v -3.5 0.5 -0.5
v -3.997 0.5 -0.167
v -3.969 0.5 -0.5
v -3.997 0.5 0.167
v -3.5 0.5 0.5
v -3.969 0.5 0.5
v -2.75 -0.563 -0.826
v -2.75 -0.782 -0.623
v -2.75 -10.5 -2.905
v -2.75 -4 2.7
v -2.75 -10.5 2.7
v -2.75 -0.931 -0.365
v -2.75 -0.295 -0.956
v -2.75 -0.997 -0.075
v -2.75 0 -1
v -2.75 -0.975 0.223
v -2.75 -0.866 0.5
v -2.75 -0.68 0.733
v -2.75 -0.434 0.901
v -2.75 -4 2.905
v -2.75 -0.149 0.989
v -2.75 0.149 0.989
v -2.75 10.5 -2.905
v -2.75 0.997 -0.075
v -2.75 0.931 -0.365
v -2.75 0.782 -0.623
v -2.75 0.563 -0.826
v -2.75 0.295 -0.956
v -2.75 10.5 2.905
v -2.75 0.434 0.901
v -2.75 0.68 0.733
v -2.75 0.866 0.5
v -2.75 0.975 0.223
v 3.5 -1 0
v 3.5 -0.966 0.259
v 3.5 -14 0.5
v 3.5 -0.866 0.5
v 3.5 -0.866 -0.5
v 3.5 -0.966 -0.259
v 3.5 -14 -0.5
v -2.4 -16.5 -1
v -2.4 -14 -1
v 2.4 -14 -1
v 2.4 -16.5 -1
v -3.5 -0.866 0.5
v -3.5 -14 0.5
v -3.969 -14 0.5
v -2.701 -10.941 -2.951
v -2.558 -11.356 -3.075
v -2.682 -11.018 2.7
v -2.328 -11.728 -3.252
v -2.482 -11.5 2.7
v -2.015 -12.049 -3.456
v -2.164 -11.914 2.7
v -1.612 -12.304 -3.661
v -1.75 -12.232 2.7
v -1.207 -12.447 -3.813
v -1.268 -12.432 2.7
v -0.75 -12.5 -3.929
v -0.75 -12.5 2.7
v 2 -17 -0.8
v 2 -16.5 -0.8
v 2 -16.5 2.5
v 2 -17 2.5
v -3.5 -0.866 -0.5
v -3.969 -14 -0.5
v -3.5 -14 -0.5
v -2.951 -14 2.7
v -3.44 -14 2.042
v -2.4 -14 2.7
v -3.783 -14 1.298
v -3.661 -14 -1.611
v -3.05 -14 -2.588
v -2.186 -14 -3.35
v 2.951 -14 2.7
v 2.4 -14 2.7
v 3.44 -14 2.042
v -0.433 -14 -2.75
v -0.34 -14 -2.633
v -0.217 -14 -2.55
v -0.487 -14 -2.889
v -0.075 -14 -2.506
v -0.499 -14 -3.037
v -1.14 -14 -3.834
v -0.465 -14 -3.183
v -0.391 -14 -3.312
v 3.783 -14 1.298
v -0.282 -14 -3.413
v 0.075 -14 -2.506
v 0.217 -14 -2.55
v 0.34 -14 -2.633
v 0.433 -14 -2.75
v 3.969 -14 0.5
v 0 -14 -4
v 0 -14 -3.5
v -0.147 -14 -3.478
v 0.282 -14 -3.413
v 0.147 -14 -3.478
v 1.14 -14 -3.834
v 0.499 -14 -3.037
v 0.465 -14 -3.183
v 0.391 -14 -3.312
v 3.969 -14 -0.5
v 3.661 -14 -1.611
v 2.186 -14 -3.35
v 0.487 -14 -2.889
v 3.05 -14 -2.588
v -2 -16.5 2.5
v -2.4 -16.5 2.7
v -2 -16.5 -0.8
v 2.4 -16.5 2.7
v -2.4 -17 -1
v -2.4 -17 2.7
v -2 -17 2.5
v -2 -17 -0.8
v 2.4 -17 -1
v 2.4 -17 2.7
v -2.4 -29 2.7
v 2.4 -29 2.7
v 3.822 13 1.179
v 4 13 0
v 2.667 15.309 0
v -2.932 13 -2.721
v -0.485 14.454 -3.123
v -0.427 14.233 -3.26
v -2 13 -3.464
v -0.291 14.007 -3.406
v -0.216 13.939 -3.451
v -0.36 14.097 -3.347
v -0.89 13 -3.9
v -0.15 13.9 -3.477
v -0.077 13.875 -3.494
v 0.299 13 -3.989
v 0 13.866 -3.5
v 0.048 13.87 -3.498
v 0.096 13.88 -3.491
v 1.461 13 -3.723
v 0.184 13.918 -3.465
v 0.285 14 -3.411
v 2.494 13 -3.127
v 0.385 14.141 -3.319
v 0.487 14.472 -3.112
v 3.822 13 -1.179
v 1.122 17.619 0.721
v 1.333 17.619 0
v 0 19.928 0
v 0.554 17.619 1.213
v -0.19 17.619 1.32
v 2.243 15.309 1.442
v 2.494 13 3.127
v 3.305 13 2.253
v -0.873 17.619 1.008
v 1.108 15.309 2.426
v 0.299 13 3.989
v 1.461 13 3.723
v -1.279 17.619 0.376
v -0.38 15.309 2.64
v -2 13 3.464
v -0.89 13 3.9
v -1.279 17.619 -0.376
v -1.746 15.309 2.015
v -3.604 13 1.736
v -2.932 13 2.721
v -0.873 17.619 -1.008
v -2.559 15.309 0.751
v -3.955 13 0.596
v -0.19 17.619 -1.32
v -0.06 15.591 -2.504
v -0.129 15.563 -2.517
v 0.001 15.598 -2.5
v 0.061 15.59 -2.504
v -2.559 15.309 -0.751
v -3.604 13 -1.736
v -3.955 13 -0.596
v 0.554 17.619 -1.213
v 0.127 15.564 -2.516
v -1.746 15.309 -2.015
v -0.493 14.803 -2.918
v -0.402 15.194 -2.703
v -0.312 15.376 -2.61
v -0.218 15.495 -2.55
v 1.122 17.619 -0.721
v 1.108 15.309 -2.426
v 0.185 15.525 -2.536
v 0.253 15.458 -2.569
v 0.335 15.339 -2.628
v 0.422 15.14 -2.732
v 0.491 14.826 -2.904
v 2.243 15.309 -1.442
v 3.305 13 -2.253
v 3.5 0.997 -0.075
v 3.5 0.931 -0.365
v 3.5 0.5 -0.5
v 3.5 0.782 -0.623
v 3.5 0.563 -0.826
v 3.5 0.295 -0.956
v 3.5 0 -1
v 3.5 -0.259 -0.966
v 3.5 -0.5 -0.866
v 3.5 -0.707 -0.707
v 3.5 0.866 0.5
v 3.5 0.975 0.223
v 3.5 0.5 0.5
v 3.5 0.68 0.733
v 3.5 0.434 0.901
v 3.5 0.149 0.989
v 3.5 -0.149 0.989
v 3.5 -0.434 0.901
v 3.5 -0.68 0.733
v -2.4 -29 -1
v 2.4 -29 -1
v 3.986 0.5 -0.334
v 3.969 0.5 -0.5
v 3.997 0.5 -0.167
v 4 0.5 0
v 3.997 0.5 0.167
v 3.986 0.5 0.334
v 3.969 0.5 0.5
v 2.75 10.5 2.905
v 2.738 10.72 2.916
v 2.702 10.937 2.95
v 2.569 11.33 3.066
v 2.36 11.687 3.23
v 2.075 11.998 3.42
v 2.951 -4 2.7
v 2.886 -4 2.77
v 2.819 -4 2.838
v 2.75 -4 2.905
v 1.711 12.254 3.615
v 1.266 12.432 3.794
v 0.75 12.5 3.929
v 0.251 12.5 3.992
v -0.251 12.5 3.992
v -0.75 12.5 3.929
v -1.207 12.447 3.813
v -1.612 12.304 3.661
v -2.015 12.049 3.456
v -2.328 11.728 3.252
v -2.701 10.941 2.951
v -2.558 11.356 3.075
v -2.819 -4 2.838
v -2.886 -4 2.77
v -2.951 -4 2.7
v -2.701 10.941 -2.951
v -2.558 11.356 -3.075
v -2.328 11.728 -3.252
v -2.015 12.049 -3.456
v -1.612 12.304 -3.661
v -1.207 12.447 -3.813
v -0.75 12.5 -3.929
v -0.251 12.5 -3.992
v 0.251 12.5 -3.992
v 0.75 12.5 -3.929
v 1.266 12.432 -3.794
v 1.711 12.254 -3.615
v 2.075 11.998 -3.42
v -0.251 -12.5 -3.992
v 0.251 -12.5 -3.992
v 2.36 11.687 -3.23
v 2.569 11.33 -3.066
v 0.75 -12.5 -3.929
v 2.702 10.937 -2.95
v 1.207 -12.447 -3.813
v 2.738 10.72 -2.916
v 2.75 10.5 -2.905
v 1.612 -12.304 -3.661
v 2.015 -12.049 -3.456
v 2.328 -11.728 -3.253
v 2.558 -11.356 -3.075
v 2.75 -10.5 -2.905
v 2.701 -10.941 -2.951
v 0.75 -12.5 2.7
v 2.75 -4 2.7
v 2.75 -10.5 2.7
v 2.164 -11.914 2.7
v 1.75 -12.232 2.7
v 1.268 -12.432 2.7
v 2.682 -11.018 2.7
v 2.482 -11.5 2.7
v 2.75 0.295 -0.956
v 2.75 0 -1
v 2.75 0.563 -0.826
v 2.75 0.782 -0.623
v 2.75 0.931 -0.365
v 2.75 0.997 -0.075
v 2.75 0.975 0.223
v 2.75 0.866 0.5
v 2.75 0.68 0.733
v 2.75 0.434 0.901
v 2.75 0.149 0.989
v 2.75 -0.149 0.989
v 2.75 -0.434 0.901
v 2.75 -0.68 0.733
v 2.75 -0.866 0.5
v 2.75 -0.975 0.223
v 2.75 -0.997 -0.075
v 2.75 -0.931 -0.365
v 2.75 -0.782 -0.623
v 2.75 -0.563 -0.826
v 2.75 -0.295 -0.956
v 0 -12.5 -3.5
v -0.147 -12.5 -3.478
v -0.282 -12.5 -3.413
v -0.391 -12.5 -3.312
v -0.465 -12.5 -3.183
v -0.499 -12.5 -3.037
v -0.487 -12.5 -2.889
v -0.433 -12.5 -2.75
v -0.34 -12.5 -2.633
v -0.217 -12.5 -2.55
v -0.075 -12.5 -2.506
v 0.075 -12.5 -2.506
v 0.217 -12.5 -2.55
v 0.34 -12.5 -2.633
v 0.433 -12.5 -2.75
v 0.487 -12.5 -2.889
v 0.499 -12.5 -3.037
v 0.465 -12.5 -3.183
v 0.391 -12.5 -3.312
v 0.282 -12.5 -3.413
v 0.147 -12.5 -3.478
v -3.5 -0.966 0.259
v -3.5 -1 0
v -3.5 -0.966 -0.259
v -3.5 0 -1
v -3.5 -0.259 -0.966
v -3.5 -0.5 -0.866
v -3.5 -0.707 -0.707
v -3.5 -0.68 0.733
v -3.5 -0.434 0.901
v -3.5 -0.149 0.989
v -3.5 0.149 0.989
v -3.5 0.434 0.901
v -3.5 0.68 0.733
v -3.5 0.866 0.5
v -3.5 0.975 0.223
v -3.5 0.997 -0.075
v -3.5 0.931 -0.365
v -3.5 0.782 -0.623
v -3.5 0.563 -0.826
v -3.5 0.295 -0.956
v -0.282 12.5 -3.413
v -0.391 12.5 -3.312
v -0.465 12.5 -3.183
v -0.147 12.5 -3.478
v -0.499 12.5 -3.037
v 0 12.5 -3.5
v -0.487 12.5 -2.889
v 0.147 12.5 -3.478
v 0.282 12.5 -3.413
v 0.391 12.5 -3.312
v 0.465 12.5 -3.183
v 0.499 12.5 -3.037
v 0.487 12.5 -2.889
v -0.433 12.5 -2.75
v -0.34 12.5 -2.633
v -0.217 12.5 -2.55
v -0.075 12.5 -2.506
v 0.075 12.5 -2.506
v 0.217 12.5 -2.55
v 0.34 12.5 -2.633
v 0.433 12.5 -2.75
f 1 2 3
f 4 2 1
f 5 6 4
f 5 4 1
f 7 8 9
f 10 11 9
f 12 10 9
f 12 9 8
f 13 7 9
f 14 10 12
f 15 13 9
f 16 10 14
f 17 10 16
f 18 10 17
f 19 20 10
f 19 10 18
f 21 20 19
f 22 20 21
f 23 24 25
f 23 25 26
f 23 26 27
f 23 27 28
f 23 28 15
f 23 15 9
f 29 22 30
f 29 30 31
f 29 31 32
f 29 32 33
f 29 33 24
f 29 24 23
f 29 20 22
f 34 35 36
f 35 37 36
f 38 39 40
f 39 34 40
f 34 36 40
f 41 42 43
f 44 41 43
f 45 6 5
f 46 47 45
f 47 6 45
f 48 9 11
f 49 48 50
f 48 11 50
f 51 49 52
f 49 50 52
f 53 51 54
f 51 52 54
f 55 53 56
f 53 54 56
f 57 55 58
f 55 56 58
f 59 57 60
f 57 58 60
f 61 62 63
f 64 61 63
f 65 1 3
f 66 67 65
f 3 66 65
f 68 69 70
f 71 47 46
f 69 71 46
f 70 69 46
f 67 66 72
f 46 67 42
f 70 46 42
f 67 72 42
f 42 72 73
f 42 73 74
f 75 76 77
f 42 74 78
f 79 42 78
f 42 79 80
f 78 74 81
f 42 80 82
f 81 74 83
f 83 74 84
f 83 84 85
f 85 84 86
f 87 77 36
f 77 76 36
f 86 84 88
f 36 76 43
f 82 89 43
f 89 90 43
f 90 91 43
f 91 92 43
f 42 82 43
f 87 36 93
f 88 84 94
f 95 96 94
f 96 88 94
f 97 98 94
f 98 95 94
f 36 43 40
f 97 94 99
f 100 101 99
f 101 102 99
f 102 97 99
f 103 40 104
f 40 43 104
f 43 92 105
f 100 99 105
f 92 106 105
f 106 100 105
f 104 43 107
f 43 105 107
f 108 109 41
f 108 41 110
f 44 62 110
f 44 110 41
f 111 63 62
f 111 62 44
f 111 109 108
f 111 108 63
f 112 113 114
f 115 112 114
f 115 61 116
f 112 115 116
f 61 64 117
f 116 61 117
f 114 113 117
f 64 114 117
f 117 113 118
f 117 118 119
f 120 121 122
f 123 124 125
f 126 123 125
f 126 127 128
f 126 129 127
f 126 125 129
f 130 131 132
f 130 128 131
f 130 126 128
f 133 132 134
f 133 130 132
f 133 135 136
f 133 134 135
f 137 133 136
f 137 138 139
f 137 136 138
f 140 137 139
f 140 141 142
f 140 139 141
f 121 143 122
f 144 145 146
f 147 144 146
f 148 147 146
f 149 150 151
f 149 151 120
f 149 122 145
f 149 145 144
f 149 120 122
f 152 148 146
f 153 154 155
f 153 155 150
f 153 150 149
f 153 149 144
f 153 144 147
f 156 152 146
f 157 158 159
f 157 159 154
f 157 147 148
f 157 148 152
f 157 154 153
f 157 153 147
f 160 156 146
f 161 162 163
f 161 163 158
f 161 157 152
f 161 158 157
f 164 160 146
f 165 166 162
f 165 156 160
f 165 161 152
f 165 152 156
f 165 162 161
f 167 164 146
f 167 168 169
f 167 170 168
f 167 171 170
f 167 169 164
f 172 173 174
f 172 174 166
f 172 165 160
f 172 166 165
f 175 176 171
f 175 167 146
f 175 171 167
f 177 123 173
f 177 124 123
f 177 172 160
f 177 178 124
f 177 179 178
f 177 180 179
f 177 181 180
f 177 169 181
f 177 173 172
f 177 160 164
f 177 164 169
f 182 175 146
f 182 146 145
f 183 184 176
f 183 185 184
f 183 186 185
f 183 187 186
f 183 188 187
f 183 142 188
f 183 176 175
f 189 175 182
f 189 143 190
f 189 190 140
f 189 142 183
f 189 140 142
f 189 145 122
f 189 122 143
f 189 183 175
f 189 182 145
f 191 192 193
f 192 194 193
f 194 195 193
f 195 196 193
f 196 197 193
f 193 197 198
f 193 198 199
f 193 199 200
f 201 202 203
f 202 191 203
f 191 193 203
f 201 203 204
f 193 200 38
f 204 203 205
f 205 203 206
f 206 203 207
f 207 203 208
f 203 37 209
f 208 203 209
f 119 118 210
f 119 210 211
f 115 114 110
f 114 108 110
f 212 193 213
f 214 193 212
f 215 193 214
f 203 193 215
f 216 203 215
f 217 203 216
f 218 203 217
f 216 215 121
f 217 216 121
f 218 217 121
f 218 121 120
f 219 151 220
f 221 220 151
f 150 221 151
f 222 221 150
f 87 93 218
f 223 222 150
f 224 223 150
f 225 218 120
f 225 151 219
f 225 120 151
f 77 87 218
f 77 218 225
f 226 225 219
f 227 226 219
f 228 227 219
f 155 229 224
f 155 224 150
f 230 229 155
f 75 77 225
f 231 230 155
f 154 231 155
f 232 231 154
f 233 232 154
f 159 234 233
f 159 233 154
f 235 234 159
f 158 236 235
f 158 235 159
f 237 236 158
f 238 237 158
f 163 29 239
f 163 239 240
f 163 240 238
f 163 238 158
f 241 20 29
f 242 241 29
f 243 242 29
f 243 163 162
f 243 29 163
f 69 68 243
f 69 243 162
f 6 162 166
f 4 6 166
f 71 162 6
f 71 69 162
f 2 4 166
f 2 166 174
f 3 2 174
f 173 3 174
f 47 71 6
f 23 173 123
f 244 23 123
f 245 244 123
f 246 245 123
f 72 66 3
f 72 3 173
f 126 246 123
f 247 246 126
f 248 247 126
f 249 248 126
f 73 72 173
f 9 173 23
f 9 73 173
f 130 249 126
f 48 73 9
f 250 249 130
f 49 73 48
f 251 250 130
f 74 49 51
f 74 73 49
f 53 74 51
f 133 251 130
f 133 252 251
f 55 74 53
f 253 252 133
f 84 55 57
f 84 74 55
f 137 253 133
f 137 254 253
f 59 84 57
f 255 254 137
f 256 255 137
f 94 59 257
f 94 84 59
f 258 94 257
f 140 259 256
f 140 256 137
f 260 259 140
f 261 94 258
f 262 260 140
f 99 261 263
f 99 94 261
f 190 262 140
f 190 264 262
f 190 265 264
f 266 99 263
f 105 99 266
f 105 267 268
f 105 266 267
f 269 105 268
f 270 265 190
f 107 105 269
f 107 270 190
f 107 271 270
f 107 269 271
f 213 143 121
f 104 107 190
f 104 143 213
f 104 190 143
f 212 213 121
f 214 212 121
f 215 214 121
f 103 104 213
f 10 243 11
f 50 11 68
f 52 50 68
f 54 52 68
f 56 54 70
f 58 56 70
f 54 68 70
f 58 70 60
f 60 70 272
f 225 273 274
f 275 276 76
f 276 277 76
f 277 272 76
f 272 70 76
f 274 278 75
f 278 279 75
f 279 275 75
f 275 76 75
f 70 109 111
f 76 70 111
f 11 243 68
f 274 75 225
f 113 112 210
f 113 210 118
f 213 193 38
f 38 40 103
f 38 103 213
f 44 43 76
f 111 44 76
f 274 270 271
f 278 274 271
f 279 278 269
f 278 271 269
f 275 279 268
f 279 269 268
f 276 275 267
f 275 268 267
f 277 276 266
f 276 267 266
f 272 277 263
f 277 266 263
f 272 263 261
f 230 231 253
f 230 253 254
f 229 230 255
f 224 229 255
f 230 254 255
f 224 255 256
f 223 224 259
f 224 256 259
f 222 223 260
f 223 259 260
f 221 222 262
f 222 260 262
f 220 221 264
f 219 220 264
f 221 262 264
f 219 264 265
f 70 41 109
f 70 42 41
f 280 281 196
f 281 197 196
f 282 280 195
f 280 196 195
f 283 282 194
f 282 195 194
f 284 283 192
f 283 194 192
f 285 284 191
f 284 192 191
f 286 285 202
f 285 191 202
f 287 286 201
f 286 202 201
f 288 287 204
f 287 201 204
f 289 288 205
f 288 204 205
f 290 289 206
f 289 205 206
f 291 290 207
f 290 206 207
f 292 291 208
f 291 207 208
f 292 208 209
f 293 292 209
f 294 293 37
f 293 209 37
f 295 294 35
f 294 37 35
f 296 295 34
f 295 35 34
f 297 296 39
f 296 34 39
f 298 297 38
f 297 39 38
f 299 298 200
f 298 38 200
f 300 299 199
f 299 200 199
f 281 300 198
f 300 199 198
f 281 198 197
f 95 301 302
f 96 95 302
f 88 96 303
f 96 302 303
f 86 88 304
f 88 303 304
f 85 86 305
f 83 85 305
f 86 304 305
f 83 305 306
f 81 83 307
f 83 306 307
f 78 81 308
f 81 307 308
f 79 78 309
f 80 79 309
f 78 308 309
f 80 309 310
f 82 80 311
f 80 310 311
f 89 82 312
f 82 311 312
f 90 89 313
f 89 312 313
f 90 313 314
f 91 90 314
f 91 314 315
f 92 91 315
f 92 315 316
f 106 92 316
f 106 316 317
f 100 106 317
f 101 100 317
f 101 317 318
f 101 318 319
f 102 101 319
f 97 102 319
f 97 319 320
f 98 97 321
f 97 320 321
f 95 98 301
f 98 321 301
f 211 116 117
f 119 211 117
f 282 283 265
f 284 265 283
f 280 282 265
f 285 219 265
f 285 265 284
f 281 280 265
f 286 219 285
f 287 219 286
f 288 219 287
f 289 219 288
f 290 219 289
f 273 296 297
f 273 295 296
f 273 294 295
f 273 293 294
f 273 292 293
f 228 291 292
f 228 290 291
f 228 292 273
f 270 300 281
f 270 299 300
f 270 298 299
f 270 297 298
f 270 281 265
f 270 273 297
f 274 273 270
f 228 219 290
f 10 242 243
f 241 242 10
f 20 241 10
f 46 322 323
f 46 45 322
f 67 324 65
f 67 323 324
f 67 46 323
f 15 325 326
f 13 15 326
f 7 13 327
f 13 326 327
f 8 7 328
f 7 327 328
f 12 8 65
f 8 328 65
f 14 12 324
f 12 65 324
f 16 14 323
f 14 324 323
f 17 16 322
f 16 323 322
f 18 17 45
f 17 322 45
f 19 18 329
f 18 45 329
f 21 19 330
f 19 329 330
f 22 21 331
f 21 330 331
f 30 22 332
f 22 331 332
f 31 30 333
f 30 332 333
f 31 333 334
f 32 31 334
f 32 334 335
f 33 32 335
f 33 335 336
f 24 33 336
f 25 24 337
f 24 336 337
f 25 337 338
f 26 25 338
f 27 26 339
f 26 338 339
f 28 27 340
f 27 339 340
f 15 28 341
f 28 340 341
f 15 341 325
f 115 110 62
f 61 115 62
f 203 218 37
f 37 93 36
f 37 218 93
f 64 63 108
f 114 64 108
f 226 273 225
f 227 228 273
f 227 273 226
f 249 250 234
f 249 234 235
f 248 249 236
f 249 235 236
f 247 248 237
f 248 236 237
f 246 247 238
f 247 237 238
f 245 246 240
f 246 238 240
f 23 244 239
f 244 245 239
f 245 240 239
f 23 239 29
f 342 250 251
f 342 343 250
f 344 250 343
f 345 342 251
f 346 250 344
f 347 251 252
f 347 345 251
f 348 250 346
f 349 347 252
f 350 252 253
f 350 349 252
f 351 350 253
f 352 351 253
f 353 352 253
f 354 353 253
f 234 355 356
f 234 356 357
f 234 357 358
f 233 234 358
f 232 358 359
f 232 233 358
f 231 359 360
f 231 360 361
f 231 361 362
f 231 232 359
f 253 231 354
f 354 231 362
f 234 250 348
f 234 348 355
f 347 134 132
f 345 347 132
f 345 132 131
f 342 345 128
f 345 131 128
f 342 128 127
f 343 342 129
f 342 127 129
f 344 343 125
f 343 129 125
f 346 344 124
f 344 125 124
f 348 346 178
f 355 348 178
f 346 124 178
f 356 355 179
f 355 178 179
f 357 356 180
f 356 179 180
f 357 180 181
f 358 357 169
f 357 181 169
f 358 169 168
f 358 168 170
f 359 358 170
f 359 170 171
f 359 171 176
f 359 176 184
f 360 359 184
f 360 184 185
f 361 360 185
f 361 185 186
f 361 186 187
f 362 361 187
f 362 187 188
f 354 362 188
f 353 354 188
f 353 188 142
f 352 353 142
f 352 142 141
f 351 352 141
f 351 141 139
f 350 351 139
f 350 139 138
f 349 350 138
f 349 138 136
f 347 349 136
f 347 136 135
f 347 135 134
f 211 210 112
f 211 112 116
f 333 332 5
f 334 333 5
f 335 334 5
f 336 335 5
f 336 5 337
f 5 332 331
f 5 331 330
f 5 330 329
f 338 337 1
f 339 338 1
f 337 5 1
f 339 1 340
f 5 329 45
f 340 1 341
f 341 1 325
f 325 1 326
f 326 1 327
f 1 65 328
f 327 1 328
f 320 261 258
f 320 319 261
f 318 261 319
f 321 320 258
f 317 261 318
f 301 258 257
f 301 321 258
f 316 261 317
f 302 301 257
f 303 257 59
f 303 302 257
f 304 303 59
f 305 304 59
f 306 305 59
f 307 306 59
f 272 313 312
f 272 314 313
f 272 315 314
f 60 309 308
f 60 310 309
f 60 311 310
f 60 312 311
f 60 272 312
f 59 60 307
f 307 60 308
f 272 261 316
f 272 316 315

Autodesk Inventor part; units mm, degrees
ref_plane "YZ Plane" through (0, 0, 0) normal (1, 0, 0) x (0, 1, 0)
ref_plane "XZ Plane" through (0, 0, 0) normal (0, 1, 0) x (-1, 0, 0)
sketch "Sketch1" plane through (0, 0, 0) normal (0, 0, 1) x (1, 0, 0)
  line L0 (0, 19.9282) -> (4, 13)
  line L1 (4, 13) -> (4, -14)
  line L2 (4, -14) -> (0, -14)
  line L3 (0, -25.9015) -> (0, 19.9282)
  line L4 (2.75, -12.5) -> (-2.75, -12.5)
  line L5 (-2.75, -12.5) -> (-2.75, 12.5)
  line L6 (-2.75, 12.5) -> (2.75, 12.5)
  line L7 (2.75, 12.5) -> (2.75, -12.5)
  point P0 (0, 0)
  dimension "d0" = 30
  dimension "d1" = 4
  dimension "d45" = 14
  dimension "d47" = 2.75
  dimension "d48" = 13
  dimension "d81" = 12.5
  dimension "d82" = 12.5
revolve "main cylinder" add sketch "Sketch1" angle 360 about axis through (0, -25.9015, 0) along (0, 1, 0) contours L0 L1 L2 L3 L4 L7 L6 | L6 L7 L4 L3
extrude "main window" cut sketch "Sketch1" against normal mid plane 25.4 contours L6 L7 L4 L3 | L3 L4 L5 L6
sketch "Sketch2" plane through (-2.75, -12.5, 2.9047) normal (1, 0, 0) x (0, 0, -1)
  point P0 (2.9047, 12.5)
  point P1 (2.9047, 12.5)
hole "full side hole" at (-2.75, 0, 0) direction (-1, 0, 0) diameter 1 depth 25.4
sketch "Sketch3" plane through (0, -14, 0) normal (0, -1, 0) x (1, 0, 0)
  circle A0 centre (0, 0) radius 4
  line L0 (-3.9686, 0.5) -> (-3.5, 0.5)
  line L1 (-3.5, 0.5) -> (-3.5, -0.5)
  line L2 (-3.5, -0.5) -> (-3.9686, -0.5)
  line L3 (-10.1288, 0) -> (5.4225, 0)
  line L4 (0, 8.0973) -> (0, -8.0973)
  line L5 (-2.9513, 2.7) -> (2.9513, 2.7)
  line L6 (3.9686, 0.5) -> (3.5, 0.5)
  line L7 (3.5, 0.5) -> (3.5, -0.5)
  line L8 (3.5, -0.5) -> (3.9686, -0.5)
  line L9 (-1.75, 2.7) -> (-1.7428, 2.7) construction
  line L10 (1.7428, 1.7526) -> (1.75, 1.7526)
  line L11 (-1.7428, 1.7526) -> (-1.75, 1.7526)
  line L12 (1.7428, 2.7) -> (1.75, 2.7) construction
  line L13 (-1.7428, 2.7) -> (1.7428, 2.7)
  point P0 (0, 0)
  point P1 (0, -3)
  point P2 (0, -7)
  point P3 (-3.5536, -1.8362)
  point P4 (3.5536, -1.8362)
  dimension "d14" = 1
  dimension "d15" = 3.5
  dimension "d20" = 3
  dimension "d35" = 2.7
  dimension "d38" = 7
hole "partial side hole" at (-2.75, 0, 0) direction (-1, 0, 0) diameter 2 depth 0.75
extrude "side channels" cut sketch "Sketch3" against normal blind 14.5 contours L3 L7 L6 A0 | A0 L8 L7 L3 | A0 L3 L1 L2 | L3 A0 L0 L1
hole "thread hole" at (0, -14, -3) direction (0, 1, 0) diameter 1 end through all
extrude "Extrusion4" cut sketch "Sketch3" against normal blind 10 contours L5 L4 A0 | L4 L5 A0
extrude "Extrusion5" cut sketch "Sketch3" along normal blind 20 contours A0 L3 L1 L2 | L3 A0 L0 L1
fillet "Fillet1" radius 2 4 edges at (-2.75, 12.5, 0) (2.75, 12.5, 0) (-2.75, -12.5, -0.1024) (2.75, -12.5, -0.1024)
mirror "Mirror4" about plane through (0, 0, 0) normal (1, 0, 0) of "partial side hole", "full side hole"
sketch "Sketch8" plane through (0, -14, 0) normal (0, -1, 0) x (1, 0, 0)
  line L0 (2.9513, 2.7) -> (-2.9513, 2.7) projected
  line L1 (2.9513, 2.7) -> (-2.9513, 2.7) projected
  arc A0 (-2.9513, 2.7) -> (-3.9686, 0.5) centre (0, 0) ccw projected
  line L2 (-3.9686, 0.5) -> (-3.5, 0.5) projected
  line L3 (-3.5, 0.5) -> (-3.5, -0.5) projected
  line L4 (-3.5, -0.5) -> (-3.9686, -0.5) projected
  arc A1 (-3.9686, -0.5) -> (3.9686, -0.5) centre (0, 0) ccw projected
  line L5 (3.9686, -0.5) -> (3.5, -0.5) projected
  line L6 (3.5, -0.5) -> (3.5, 0.5) projected
  line L7 (3.5, 0.5) -> (3.9686, 0.5) projected
  arc A2 (3.9686, 0.5) -> (2.9513, 2.7) centre (0, 0) ccw projected
  circle A3 centre (0, -3) radius 0.5 projected
  line L8 (-2.9513, 2.7) -> (2.9513, 2.7) projected
  circle A4 centre (0, 0) radius 4 projected
  line L9 (-2.4, -1) -> (-2.4, 2.7)
  line L10 (2.4, -1) -> (2.4, 2.7)
  line L11 (-2.4, -1) -> (2.4, -1)
  point P0 (0, 15.9155)
  point P1 (0, -1)
  dimension "d105" = 4.8
  dimension "d115" = 1
extrude "Extrusion11" add sketch "Sketch8" along normal blind 15 contours L10 L11 L9 L0
ref_plane "Work Plane5" through (0, -16.5, 0) normal (0, -1, 0) x (1, 0, 0)
sketch "Sketch9" plane through (0, -16.5, 0) normal (0, -1, 0) x (1, 0, 0)
  line L0 (2.4, -1) -> (-2.4, -1) projected
  line L1 (-2.4, -1) -> (-2.4, 2.7) projected
  line L2 (2.4, 2.7) -> (2.4, -1) projected
  line L3 (-2.9513, 2.7) -> (2.9513, 2.7) projected
  line L4 (2, 2.5) -> (-2, 2.5)
  line L5 (-2, 2.5) -> (-2, -0.8)
  line L6 (-2, -0.8) -> (2, -0.8)
  line L7 (2, -0.8) -> (2, 2.5)
  point P0 (0, 0)
  point P1 (0, 2.5)
  point P2 (0, -1)
  point P3 (0, -1)
  dimension "d108" = 4
  dimension "d109" = 3.3
  dimension "d111" = 0.2
  dimension "d112" = 0.4
extrude "Extrusion12" cut sketch "Sketch9" along normal blind 0.5
properties part number "Rotator Frame_xw" material "SAN Plastic"
